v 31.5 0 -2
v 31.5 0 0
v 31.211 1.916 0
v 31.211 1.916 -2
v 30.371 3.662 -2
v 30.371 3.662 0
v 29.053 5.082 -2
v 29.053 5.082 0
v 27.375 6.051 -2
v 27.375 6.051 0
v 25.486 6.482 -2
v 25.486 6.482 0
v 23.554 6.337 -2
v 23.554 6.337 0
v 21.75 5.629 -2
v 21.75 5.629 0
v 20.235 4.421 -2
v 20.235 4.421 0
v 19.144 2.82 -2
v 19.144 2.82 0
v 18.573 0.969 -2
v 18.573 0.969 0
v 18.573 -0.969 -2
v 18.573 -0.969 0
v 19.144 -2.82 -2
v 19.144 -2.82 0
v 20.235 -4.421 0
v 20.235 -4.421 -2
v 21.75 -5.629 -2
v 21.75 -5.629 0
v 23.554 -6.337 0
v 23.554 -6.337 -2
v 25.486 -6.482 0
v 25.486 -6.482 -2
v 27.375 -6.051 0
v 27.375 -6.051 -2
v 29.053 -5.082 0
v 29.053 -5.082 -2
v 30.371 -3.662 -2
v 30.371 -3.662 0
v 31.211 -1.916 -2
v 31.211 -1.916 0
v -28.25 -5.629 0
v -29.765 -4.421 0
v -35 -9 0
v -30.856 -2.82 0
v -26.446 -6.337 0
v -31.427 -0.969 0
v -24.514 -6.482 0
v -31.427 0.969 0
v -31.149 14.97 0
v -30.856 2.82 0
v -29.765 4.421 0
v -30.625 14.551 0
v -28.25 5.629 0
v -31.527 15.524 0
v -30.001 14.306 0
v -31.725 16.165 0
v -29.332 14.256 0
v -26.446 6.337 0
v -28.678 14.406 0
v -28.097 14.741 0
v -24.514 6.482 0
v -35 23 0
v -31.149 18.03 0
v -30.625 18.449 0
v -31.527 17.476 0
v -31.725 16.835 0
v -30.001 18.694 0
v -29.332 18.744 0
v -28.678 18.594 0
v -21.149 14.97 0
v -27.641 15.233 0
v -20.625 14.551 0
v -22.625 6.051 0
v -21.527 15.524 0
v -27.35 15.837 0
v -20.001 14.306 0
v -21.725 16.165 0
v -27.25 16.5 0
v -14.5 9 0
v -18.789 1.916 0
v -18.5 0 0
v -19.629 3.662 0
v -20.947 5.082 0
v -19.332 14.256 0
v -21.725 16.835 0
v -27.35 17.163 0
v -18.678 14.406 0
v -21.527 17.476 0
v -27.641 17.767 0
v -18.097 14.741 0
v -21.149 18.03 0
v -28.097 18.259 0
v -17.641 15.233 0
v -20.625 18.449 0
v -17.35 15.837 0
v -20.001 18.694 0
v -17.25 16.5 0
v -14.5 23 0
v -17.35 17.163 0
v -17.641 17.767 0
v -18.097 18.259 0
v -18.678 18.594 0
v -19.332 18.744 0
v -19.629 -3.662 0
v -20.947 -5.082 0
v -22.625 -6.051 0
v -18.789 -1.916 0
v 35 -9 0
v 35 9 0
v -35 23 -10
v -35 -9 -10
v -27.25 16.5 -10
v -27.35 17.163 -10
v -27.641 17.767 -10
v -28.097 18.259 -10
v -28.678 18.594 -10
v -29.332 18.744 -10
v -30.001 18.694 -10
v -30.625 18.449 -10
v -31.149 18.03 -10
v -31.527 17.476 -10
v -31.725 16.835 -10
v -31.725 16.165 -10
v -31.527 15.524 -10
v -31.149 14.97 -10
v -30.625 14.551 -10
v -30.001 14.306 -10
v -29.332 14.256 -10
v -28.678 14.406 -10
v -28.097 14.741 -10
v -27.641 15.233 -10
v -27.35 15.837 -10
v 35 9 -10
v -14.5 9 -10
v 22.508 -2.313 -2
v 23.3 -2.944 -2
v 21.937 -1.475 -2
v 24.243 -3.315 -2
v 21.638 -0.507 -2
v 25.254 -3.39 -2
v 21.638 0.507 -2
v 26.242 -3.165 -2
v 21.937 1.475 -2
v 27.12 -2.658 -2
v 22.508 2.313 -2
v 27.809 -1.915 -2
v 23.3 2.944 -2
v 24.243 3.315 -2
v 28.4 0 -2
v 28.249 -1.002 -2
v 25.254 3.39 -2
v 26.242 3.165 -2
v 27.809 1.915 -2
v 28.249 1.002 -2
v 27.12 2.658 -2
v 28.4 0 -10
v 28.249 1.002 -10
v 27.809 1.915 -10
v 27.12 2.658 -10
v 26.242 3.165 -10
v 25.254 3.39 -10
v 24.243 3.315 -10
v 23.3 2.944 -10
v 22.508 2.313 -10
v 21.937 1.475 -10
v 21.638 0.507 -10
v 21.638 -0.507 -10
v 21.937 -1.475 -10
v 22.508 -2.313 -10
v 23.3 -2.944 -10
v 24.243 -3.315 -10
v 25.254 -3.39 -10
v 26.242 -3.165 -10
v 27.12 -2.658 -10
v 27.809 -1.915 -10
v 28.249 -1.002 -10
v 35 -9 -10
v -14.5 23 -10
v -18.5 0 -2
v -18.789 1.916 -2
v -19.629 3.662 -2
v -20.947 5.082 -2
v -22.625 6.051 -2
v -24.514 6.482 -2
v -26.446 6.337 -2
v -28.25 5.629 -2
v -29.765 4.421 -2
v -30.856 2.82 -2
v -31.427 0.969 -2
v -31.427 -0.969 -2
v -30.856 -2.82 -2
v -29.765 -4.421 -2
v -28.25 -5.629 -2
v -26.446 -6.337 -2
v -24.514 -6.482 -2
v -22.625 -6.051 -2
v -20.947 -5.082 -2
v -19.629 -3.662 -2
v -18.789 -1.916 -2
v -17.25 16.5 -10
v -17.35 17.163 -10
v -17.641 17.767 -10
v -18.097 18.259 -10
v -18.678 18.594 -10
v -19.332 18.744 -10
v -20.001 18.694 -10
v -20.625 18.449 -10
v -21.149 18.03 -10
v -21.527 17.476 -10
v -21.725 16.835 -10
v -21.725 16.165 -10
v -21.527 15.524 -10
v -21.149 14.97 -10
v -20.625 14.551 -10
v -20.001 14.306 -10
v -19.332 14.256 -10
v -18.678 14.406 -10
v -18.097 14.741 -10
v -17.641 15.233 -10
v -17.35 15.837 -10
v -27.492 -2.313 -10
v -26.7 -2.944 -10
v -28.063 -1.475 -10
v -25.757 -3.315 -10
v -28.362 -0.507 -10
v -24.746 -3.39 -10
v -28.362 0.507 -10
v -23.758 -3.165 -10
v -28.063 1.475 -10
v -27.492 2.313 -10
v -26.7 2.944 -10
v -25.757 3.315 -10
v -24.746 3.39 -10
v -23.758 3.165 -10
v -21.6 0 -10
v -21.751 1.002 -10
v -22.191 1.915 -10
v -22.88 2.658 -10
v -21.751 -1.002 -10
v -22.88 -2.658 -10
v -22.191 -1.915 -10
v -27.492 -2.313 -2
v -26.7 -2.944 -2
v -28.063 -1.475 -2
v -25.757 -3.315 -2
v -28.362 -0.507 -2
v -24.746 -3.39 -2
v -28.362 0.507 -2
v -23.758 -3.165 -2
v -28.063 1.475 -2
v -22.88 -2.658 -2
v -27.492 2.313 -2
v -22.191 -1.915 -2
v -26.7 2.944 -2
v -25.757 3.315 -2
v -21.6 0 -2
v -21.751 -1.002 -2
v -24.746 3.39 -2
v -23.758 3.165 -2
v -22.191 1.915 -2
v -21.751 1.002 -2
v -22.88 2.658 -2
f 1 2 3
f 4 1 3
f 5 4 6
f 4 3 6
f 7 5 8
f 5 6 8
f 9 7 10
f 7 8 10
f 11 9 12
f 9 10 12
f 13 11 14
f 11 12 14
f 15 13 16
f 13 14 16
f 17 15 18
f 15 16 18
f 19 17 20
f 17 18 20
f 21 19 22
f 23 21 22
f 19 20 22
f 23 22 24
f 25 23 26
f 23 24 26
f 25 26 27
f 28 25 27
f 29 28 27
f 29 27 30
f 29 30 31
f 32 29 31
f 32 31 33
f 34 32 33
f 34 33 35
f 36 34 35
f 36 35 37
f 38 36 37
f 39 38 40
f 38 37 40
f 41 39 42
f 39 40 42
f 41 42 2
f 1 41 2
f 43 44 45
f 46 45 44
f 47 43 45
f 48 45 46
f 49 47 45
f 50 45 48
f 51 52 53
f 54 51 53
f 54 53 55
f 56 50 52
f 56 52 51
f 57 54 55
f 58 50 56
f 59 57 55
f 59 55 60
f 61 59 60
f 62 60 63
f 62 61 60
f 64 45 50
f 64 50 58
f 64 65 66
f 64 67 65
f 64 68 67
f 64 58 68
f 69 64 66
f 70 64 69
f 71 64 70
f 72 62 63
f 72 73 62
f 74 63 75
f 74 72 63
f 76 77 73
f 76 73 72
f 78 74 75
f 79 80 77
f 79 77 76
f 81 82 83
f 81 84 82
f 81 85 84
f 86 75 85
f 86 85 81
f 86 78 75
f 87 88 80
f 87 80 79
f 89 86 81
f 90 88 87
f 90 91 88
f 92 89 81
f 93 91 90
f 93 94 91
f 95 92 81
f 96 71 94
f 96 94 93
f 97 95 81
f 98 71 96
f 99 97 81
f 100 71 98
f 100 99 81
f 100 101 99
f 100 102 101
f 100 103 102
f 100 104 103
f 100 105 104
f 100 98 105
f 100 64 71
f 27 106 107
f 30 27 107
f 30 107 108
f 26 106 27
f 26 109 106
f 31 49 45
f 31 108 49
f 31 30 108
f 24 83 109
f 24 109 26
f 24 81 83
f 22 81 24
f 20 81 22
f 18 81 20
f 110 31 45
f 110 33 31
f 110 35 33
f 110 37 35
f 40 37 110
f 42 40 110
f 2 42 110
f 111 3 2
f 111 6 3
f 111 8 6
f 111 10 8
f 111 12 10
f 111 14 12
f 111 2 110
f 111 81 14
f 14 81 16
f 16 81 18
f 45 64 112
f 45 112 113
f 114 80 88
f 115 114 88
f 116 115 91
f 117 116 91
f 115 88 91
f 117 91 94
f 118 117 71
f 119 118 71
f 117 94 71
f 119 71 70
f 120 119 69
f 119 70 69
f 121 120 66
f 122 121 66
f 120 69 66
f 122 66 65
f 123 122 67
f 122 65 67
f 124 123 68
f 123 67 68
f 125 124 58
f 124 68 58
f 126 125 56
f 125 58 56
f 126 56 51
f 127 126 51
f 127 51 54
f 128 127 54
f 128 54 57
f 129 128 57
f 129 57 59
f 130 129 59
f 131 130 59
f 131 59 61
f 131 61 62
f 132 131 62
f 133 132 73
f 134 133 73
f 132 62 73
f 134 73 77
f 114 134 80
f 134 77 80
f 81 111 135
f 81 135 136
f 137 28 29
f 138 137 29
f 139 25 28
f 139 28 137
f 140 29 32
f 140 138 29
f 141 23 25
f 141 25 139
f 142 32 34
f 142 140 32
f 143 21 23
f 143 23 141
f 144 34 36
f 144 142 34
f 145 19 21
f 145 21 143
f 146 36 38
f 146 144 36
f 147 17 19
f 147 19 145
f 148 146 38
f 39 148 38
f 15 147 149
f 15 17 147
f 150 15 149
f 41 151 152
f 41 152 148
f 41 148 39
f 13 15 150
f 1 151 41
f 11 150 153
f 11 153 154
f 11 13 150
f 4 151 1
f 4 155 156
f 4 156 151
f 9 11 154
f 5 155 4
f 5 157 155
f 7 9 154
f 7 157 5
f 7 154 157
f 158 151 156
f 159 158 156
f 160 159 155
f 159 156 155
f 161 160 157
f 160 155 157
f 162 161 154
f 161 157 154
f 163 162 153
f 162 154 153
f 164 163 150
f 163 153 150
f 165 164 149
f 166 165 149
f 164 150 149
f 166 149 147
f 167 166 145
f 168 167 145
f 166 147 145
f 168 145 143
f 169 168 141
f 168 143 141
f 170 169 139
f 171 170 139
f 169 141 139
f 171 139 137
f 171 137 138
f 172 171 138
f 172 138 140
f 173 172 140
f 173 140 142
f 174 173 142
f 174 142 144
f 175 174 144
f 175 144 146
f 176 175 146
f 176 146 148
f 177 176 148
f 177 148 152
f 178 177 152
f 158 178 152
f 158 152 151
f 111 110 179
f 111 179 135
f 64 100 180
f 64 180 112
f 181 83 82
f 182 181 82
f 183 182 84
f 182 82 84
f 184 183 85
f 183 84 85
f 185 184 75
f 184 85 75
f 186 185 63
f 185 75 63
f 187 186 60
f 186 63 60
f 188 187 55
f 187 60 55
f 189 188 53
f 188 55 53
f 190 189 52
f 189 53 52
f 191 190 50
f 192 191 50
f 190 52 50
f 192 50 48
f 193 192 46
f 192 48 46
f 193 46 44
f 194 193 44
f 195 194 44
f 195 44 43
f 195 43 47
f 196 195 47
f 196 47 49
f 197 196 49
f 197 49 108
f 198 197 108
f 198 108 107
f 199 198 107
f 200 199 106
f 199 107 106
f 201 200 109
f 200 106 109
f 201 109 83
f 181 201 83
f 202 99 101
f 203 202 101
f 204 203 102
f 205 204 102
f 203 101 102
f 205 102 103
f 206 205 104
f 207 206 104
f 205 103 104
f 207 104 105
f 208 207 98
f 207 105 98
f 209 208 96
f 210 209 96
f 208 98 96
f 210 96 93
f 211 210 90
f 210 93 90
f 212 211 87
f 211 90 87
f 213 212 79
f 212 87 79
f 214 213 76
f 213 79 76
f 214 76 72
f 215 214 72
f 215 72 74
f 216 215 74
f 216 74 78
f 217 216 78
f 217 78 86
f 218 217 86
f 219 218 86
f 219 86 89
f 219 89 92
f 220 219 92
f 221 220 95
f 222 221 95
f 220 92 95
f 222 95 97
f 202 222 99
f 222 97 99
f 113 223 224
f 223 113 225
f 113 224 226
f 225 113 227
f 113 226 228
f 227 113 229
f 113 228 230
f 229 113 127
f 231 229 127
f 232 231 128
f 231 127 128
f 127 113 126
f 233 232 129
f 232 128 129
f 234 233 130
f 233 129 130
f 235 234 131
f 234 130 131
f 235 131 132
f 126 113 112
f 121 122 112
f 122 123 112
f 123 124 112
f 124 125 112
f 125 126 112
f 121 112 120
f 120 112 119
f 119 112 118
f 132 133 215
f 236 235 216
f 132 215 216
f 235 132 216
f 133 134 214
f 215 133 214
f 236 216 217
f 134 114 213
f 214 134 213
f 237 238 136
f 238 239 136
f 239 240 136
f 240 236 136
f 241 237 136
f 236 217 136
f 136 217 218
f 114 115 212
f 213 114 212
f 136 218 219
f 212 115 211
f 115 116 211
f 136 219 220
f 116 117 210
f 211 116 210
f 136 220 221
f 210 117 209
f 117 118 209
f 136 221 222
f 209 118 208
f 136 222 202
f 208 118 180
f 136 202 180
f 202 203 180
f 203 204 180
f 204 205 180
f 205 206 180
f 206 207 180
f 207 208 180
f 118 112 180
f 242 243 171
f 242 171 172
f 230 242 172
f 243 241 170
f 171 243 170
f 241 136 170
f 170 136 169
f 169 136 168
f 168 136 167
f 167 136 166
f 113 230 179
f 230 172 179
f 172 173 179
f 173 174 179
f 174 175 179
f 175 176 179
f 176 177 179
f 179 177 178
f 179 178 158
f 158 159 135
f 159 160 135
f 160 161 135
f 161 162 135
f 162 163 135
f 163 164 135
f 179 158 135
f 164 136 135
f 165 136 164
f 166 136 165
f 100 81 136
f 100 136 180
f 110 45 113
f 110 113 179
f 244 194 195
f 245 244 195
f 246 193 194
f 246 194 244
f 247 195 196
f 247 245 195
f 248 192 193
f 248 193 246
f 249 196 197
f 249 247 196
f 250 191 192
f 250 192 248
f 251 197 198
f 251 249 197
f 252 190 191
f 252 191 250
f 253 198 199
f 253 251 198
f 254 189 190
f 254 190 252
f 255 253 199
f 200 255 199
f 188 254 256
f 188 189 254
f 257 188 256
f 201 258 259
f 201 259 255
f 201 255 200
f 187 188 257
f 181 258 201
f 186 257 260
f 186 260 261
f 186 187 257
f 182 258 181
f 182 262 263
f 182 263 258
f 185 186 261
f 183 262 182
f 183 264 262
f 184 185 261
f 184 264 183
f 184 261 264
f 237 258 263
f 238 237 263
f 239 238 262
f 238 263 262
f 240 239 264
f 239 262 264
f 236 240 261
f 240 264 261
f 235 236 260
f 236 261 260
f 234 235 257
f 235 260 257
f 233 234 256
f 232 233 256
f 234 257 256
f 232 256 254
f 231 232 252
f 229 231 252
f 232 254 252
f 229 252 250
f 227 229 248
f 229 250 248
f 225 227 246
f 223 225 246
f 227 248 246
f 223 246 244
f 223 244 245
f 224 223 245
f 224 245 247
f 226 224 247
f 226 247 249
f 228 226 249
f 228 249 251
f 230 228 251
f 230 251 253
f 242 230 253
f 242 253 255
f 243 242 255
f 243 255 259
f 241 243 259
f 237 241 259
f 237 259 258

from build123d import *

# Parameters (mm, degrees)
SKETCH069_R     = 2.25
SKETCH069_R_2   = 3.4
PAD046_DEPTH    = 10
SKETCH070_R     = 6.5
POCKET019_DEPTH = 2


with BuildPart() as body_7_body:
    # Sketch069 → Pad046 (new body)
    with BuildSketch(Plane.XY):
        Polygon((-35, 23), (-35, -9), (35, -9), (35, 9), (-14.5, 9), (-14.5, 23), align=None)
        with Locations((-29.5, 16.5)):
            Circle(SKETCH069_R, mode=Mode.SUBTRACT)
        with Locations((-19.5, 16.5)):
            Circle(SKETCH069_R, mode=Mode.SUBTRACT)
        with Locations((-25, 0)):
            Circle(SKETCH069_R_2, mode=Mode.SUBTRACT)
        with Locations((25, 0)):
            Circle(SKETCH069_R_2, mode=Mode.SUBTRACT)
    extrude(amount=PAD046_DEPTH)

    # Sketch070 → Pocket019 (cut)
    with BuildSketch(Plane.XY):
        with Locations((-25, 0)):
            Circle(SKETCH070_R)
        with Locations((25, 0)):
            Circle(SKETCH070_R)
    extrude(amount=POCKET019_DEPTH, mode=Mode.SUBTRACT)


with BuildPart() as part_mirroring:
    # Part__Mirroring: instance of Body_7 body
    add(body_7_body.part.mirror(Plane(origin=(0, 0, 0), x_dir=(0, 1, 0), z_dir=(0, 0, 1))))


solid = part_mirroring.part
